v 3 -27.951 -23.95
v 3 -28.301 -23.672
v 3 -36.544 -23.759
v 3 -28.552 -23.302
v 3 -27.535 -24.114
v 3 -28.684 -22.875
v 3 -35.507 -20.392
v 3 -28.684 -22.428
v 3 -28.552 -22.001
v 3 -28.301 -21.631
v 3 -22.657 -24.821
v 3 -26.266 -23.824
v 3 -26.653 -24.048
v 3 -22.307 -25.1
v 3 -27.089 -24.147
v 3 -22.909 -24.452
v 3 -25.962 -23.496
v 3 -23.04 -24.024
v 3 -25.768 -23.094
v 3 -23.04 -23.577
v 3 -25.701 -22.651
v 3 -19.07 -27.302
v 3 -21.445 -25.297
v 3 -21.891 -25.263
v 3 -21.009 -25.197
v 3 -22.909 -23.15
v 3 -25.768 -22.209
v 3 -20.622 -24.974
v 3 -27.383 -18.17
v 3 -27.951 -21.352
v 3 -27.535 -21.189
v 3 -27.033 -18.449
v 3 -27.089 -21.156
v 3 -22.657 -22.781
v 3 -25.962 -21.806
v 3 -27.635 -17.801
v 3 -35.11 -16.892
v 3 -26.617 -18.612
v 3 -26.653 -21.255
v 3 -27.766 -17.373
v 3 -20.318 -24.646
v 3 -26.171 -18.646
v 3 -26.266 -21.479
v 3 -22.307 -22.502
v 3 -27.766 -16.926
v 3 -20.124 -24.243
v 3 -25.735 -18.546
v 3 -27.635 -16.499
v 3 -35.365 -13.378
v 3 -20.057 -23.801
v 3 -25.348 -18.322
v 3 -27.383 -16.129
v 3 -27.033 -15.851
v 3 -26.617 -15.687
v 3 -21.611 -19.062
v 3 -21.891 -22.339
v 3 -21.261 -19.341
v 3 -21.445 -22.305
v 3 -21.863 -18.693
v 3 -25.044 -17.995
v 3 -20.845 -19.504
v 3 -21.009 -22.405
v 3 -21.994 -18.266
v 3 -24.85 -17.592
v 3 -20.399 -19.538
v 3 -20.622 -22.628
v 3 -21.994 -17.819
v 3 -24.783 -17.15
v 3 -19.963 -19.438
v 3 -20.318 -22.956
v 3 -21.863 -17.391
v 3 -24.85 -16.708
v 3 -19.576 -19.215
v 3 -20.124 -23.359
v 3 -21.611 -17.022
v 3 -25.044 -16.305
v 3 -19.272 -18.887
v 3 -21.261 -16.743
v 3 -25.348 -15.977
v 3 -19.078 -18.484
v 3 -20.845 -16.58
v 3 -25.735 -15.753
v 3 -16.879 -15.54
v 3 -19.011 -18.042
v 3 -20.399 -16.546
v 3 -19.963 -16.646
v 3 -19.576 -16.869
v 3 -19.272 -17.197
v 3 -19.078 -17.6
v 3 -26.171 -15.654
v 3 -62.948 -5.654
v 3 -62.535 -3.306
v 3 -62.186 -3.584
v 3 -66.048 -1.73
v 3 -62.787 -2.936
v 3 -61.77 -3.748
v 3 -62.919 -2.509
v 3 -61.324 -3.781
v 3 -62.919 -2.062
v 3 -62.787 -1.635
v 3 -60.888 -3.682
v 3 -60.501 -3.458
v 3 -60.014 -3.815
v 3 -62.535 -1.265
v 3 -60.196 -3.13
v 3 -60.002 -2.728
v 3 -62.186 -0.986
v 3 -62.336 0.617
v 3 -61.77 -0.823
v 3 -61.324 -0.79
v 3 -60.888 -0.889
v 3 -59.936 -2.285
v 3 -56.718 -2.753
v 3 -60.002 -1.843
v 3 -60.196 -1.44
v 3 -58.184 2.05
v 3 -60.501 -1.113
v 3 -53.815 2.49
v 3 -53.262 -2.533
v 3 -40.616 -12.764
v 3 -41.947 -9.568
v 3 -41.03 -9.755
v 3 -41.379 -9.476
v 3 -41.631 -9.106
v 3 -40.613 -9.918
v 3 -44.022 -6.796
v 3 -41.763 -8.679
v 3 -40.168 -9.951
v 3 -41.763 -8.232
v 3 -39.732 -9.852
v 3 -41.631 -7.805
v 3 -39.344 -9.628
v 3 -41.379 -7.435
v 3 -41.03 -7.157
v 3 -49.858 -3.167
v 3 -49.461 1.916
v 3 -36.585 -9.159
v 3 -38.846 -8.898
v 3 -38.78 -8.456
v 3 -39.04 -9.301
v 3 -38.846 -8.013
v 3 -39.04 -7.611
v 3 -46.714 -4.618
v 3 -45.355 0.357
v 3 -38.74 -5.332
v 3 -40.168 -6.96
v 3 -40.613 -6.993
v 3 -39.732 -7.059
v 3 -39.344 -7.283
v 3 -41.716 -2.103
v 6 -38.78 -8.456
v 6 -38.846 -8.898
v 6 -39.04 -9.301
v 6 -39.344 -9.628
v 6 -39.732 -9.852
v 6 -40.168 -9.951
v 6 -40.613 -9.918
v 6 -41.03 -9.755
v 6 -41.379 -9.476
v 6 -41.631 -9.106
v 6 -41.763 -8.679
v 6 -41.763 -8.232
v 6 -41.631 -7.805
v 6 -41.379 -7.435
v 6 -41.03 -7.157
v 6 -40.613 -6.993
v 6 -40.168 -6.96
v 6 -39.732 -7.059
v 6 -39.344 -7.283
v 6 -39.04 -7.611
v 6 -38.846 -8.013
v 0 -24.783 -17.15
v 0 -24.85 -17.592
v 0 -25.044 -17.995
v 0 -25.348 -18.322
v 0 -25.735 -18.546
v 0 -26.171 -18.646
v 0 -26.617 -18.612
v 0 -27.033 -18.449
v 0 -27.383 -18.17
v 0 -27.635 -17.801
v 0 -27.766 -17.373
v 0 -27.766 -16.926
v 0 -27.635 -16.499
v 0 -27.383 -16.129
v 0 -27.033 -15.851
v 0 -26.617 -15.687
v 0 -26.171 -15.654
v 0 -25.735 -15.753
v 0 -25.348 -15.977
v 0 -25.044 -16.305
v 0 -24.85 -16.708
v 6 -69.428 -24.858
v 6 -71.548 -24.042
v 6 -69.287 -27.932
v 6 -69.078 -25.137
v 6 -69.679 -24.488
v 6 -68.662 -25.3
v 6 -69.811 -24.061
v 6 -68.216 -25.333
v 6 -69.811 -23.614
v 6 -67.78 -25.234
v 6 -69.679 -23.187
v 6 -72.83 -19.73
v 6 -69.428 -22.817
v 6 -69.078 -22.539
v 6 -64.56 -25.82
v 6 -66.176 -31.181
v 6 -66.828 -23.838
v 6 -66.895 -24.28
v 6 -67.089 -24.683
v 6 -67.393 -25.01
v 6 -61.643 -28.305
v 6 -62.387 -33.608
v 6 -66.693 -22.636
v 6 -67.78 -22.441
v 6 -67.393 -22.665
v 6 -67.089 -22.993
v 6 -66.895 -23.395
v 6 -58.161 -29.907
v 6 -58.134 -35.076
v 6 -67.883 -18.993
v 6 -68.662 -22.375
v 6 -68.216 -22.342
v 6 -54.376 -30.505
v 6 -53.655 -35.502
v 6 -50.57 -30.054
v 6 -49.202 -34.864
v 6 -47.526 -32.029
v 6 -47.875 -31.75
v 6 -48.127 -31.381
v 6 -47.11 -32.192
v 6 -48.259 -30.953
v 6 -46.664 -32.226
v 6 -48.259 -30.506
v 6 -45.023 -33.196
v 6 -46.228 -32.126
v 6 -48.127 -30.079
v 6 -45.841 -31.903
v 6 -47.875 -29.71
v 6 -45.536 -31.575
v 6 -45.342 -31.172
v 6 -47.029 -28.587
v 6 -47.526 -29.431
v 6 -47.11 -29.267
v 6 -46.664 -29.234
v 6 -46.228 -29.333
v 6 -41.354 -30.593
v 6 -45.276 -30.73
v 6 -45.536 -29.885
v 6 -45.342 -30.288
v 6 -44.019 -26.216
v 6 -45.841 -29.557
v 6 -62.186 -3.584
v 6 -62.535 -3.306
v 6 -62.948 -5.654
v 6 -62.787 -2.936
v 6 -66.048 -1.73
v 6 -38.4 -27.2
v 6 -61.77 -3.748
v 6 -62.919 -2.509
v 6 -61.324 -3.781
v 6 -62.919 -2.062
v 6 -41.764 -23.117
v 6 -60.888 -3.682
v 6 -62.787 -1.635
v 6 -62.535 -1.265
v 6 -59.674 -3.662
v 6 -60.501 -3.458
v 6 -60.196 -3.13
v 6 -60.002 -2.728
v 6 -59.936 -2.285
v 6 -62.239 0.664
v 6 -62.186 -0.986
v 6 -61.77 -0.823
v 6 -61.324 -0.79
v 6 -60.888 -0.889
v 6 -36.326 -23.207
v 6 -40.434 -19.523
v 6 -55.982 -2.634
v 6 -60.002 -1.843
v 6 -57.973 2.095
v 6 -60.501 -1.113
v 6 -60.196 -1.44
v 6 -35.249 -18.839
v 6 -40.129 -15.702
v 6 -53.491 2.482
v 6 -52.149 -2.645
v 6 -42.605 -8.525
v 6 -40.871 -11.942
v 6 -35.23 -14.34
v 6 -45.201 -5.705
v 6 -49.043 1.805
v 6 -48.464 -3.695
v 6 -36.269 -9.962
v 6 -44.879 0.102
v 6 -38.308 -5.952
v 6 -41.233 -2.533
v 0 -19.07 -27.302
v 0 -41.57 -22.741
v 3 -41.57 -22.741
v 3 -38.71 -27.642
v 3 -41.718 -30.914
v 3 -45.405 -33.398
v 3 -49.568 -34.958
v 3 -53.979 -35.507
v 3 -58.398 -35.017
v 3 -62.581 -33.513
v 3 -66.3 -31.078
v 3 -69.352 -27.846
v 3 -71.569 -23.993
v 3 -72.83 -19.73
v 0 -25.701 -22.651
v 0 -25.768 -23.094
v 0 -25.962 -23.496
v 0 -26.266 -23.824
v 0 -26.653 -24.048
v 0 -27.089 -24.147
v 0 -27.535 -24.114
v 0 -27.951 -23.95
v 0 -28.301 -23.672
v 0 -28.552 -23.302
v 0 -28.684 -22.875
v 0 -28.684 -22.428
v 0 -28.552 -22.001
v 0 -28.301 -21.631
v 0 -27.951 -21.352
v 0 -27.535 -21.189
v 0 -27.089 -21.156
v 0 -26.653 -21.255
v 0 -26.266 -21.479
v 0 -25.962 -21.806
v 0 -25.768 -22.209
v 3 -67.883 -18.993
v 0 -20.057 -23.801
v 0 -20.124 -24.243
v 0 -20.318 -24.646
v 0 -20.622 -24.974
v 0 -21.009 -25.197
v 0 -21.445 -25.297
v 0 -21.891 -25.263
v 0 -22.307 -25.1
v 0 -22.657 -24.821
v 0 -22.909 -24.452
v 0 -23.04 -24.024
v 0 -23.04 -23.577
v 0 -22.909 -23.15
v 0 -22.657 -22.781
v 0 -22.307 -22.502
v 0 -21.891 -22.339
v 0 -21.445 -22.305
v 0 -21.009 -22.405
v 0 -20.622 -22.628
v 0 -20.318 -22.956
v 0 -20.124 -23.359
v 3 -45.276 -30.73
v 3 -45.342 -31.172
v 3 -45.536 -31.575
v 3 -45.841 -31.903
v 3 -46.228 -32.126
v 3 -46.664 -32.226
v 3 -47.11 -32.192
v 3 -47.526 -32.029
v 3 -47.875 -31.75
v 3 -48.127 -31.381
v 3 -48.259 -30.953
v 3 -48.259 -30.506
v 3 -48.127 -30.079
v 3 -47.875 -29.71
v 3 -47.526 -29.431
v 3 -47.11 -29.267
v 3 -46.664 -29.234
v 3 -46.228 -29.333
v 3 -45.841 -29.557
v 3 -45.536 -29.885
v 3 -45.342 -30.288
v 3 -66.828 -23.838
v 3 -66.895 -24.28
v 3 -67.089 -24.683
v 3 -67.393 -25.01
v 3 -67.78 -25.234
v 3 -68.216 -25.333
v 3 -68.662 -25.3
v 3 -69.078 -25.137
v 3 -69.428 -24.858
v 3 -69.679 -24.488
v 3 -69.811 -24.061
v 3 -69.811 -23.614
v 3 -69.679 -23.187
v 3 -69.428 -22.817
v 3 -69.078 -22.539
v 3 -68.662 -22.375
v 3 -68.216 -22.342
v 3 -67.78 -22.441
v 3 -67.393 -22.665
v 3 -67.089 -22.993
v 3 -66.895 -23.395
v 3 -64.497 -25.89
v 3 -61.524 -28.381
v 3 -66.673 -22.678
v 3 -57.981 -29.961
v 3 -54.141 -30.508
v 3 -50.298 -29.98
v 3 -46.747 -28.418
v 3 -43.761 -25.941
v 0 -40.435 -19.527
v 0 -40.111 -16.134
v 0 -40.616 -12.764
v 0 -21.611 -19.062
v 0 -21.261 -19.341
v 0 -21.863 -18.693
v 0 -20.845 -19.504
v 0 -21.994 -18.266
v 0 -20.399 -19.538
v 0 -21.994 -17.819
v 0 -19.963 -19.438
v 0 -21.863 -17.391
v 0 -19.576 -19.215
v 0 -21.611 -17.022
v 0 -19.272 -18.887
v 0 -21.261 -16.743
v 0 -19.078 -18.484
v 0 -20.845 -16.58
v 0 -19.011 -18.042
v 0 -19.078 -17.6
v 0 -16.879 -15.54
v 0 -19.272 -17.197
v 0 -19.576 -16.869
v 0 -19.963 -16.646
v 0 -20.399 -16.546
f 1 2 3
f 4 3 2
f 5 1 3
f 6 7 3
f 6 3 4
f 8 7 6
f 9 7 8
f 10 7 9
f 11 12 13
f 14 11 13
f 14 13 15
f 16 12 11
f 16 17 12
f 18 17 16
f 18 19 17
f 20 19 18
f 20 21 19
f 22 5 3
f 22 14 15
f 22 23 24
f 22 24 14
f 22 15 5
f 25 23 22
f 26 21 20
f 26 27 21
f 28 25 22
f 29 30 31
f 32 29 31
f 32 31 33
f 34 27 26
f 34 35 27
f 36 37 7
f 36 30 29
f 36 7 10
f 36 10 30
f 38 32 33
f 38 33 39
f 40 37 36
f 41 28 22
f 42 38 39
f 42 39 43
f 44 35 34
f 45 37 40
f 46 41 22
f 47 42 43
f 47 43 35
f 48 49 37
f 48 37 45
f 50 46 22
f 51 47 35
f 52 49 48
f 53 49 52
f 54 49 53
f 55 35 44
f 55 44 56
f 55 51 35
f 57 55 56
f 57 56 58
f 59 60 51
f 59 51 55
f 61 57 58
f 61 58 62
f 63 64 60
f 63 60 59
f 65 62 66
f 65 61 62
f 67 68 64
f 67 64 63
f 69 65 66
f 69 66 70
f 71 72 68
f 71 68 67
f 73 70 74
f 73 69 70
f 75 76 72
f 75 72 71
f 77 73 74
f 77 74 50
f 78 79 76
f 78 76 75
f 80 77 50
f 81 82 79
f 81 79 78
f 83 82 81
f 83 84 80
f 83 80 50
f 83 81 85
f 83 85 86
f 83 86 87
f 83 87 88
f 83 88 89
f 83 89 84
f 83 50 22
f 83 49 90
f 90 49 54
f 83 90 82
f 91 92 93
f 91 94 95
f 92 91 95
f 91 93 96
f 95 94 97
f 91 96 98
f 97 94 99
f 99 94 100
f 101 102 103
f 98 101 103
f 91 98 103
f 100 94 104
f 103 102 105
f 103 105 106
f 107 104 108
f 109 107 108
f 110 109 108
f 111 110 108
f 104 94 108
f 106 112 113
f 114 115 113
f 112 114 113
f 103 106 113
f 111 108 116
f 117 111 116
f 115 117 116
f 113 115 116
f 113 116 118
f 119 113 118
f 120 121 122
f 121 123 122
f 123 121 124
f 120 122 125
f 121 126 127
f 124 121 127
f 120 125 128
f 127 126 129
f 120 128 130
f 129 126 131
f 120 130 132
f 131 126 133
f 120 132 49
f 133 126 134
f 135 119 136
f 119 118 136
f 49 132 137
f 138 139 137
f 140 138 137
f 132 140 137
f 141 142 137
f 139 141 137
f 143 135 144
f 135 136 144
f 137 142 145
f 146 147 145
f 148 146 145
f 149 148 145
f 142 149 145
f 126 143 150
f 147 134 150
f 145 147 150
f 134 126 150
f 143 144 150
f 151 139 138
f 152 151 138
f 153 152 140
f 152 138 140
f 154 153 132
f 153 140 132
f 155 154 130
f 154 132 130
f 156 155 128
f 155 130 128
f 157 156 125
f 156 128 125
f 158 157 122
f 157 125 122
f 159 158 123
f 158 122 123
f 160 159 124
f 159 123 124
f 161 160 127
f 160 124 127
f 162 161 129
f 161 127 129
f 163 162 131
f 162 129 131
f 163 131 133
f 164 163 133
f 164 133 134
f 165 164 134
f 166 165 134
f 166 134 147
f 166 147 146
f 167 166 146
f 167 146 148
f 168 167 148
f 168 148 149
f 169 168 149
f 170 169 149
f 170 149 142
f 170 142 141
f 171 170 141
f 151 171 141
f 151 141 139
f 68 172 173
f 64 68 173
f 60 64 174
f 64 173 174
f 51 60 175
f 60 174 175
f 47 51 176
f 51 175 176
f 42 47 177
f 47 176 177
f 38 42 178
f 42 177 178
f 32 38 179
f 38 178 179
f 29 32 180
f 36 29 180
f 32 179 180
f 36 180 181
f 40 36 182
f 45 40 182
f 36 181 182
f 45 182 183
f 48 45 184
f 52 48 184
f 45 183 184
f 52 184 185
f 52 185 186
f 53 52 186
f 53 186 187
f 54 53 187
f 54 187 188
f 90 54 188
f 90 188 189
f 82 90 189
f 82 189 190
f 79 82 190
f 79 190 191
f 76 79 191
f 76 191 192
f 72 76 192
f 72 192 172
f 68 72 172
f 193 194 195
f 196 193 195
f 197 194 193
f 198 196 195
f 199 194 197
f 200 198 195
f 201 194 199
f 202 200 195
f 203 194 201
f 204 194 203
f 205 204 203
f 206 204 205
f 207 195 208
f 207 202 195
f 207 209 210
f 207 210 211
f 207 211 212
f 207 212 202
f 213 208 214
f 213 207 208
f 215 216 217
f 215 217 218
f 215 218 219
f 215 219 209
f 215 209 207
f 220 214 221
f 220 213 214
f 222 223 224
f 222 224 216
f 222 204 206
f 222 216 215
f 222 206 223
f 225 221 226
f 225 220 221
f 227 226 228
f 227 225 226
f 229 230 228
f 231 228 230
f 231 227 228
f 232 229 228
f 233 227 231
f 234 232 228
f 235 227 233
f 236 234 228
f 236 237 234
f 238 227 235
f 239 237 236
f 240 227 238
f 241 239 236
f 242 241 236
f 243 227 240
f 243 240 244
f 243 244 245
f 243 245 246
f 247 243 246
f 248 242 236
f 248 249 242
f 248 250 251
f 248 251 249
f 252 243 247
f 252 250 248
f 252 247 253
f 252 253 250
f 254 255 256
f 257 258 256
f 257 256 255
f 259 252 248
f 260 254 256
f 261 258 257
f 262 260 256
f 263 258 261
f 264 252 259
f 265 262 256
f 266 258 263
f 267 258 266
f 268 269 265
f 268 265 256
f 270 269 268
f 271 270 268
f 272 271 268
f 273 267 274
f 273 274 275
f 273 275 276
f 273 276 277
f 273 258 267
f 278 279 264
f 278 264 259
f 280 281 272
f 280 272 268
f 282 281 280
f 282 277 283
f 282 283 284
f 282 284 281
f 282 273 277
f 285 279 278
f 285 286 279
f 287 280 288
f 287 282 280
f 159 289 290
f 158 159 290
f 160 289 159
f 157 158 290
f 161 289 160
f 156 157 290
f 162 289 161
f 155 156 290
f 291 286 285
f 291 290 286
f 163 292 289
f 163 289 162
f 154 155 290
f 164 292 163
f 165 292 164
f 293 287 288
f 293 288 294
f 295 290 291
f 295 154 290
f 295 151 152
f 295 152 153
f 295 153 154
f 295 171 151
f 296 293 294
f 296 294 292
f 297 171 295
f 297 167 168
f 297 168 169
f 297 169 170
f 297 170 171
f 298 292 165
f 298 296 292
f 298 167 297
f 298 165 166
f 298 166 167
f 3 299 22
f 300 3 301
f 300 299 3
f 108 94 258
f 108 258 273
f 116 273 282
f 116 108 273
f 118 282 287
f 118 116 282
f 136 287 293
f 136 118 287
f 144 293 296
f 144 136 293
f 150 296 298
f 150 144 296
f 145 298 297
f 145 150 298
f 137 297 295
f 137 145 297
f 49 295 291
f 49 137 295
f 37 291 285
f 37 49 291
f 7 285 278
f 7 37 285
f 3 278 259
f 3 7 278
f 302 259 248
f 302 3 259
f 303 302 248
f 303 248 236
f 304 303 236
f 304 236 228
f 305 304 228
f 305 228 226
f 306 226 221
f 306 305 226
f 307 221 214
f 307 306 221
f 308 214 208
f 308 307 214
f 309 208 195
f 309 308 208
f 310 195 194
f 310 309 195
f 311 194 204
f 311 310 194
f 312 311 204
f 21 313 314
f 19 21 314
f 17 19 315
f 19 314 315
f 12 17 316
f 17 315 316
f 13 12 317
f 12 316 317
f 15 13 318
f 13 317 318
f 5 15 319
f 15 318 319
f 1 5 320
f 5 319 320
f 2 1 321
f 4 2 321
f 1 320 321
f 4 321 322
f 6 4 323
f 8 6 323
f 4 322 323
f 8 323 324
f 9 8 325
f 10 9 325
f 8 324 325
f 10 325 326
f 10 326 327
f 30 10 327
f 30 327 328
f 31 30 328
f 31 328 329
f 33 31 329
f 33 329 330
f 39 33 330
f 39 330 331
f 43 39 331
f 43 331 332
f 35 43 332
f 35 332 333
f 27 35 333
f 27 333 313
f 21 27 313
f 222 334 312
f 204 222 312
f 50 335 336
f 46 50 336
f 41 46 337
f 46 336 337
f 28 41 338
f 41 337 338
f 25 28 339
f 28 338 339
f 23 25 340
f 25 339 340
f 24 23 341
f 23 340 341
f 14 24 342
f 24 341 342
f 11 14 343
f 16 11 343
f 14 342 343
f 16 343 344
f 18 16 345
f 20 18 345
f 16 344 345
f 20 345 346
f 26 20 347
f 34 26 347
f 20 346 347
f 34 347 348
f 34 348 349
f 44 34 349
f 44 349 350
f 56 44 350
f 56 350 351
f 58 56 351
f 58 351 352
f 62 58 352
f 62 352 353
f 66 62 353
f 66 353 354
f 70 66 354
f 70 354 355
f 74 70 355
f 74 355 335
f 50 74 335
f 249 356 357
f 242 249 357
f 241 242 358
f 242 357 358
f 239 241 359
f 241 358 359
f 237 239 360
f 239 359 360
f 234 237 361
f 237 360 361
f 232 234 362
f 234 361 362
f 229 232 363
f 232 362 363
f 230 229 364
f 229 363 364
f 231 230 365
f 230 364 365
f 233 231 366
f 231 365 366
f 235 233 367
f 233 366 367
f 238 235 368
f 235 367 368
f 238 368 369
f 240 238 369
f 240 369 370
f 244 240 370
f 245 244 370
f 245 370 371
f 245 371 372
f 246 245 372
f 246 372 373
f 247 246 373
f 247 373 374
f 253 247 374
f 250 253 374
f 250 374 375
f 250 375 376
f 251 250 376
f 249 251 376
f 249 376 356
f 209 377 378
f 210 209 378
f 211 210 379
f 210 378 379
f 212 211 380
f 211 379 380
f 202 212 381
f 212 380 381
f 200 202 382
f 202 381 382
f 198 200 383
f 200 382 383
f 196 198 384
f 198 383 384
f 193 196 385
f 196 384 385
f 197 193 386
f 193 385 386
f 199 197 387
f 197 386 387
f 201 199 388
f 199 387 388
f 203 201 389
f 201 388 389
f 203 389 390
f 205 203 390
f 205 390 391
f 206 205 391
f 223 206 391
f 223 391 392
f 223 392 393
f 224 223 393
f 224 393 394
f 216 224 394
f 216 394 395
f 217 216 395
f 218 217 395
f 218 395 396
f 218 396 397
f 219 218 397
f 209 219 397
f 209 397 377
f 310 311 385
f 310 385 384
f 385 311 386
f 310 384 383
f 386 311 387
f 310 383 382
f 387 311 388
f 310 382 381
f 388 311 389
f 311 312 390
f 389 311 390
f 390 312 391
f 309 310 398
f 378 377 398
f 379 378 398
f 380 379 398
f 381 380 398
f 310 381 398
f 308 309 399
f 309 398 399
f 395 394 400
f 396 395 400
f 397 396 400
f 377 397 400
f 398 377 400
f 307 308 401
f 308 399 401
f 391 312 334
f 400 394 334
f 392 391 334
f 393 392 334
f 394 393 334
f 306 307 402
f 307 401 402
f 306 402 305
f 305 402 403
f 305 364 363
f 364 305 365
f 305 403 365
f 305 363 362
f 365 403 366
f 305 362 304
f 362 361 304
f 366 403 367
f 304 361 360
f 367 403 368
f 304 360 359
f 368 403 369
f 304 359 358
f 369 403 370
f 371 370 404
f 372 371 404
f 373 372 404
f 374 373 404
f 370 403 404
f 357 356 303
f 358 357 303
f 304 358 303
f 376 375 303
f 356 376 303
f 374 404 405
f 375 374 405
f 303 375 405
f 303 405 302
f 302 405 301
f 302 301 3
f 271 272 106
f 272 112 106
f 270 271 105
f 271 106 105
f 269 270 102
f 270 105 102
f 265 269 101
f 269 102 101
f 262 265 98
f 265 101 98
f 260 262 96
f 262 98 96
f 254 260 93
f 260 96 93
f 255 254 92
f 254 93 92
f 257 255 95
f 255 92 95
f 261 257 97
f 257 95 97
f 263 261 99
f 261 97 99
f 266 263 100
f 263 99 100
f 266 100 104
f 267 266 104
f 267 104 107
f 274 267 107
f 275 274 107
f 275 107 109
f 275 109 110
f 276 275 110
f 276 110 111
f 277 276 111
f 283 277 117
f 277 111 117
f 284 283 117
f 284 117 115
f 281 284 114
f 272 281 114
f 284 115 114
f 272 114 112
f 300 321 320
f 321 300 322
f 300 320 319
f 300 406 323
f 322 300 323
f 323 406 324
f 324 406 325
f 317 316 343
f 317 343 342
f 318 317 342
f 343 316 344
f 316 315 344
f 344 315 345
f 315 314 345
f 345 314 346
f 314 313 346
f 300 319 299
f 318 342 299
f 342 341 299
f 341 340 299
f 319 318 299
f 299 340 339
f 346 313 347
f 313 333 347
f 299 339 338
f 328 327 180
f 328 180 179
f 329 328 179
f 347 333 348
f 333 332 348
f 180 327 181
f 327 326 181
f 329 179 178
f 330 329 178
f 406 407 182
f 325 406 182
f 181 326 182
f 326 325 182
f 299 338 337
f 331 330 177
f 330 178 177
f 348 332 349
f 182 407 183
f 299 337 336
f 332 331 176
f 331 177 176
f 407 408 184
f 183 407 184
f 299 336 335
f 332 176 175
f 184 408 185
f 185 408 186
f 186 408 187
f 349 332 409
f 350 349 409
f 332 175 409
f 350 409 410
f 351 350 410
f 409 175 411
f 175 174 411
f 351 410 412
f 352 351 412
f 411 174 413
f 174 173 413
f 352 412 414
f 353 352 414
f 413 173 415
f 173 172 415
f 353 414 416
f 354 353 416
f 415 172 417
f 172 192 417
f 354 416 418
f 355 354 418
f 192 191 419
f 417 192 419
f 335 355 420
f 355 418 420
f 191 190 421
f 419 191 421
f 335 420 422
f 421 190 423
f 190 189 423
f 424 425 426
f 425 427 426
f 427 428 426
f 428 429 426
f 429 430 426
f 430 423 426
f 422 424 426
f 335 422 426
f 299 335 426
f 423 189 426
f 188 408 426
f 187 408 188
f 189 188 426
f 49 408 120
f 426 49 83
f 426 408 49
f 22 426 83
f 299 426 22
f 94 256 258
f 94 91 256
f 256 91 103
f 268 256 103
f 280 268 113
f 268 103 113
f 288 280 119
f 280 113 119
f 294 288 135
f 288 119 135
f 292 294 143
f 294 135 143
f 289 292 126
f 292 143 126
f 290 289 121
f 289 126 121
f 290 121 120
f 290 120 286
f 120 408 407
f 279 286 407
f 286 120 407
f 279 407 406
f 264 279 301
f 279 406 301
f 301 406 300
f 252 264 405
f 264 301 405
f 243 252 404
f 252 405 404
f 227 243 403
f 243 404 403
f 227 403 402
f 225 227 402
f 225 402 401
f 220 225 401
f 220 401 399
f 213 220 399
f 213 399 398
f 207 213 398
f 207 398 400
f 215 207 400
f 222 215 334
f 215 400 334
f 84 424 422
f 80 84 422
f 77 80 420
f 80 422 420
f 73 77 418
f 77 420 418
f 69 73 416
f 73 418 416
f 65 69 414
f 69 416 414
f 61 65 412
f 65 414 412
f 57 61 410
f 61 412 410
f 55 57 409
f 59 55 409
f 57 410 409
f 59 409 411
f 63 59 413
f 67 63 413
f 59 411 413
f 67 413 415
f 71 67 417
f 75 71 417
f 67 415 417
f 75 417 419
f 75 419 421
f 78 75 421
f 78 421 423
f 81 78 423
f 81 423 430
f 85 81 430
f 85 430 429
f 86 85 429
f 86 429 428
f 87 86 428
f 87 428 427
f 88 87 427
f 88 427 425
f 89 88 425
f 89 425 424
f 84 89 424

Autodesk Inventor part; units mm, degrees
ref_plane "YZ Plane" through (0, 0, 0) normal (1, 0, 0) x (0, 1, 0)
ref_plane "XZ Plane" through (0, 0, 0) normal (0, 1, 0) x (-1, 0, 0)
ref_plane "XY Plane" through (0, 0, 0) normal (0, 0, 1) x (1, 0, 0)
sketch "Эскиз1" plane through (0, 0, 0) normal (1, 0, 0) x (0, 1, 0)
  circle A0 centre (-54.1058, -16.5076) radius 16
  circle A1 centre (-54.1058, -16.5076) radius 14
  circle A2 centre (-54.1058, -16.5076) radius 19
  line L0 (-54.1058, -16.5076) -> (-62.8101, 0.3813)
  line L1 (-54.1058, -16.5076) -> (-45.4015, -33.3965)
  line L2 (-54.1058, -16.5076) -> (-70.9947, -25.2119)
  line L3 (-54.1058, -16.5076) -> (-37.6871, -6.9458)
  line L4 (-67.8834, -18.9928) -> (-72.8305, -19.73)
  line L5 (-62.9482, -5.6535) -> (-66.048, -1.7298)
  line L6 (-40.6156, -12.7639) -> (-16.8789, -15.5395)
  line L7 (-16.8789, -15.5395) -> (-19.0698, -27.3017)
  line L8 (-19.0698, -27.3017) -> (-41.5699, -22.7407)
  line L9 (-28.383, -14.1943) -> (-30.5675, -24.971)
  line L10 (-28.383, -14.1943) -> (-19.0698, -27.3017)
  line L11 (-30.5675, -24.971) -> (-16.8789, -15.5395)
  line L12 (-23.9604, -20.4186) -> (-22.9207, -14.833)
  line L13 (-22.9207, -14.833) -> (-29.4202, -19.3112)
  line L14 (-22.9207, -14.833) -> (-17.9743, -21.4206)
  line L15 (-23.9604, -20.4186) -> (-24.9531, -26.1091)
  line L16 (-17.9743, -21.4206) -> (-24.9429, -26.0503)
  line L17 (-29.4202, -19.3112) -> (-24.9429, -26.0503)
  circle A3 centre (-61.4358, -2.2854) radius 1.5
  circle A4 centre (-68.328, -23.8376) radius 1.5
  circle A5 centre (-46.7758, -30.7298) radius 1.5
  circle A6 centre (-40.2796, -8.4556) radius 1.5
  circle A7 centre (-26.2831, -17.1497) radius 1.5
  circle A8 centre (-20.5111, -18.0421) radius 1.5
  circle A9 centre (-21.5572, -23.8009) radius 1.5
  circle A10 centre (-27.201, -22.6514) radius 1.5
  point P0 (-6.6177, -23.1834)
  point P1 (-76.739, -12.454)
  point P2 (39.1344, -10.1827)
  point P3 (-35.3653, -13.3778)
  point P4 (-36.5442, -23.7594)
  dimension "d0" = 32
  dimension "d2" = 28
  dimension "d3" = 38
  dimension "d7" = 3
  dimension "d8" = 3
  dimension "d9" = 3
  dimension "d10" = 3
  dimension "d11" = 3
  dimension "d12" = 3
  dimension "d13" = 3
  dimension "d15" = 3
extrude "Выдавливание1" add sketch "Эскиз1" along normal blind 6 contours A0 L8 A1 L6 | A0 L6 A2 L8 | L6 A1 L3 A6 A0 | A0 A6 L3 A2 L6 | L8 A2 L1 A5 A0 | A0 A5 L1 A1 L8 | L3 A1 L0 A3 A0 A6 | L3 A6 A0 A3 L0 A2 | A5 A0 A4 L2 A1 L1 | A2 L2 A4 A0 A5 L1 | A1 L5 A0 A3 L0 | L0 A3 A0 L5 A2 | A2 L4 A0 A4 L2 | L2 A4 A0 L4 A1
extrude "Выдавливание2" add sketch "Эскиз1" along normal blind 3 contours L6 L9 L8 A2 | L10 A7 L13 L9 | L6 L13 A7 L10 | L11 A10 L17 L15 L8 | L9 L17 A10 L11 | L14 A8 L11 L12 | L12 L10 A7 L13 | L6 L11 A8 L14 | L13 A7 L10 L11 A10 L17 | L15 L16 A9 L10 L8 | L7 L14 A8 L11 | L11 A8 L14 L16 A9 L10 | L15 L17 A10 L11 | L10 A9 L16 L15 | L10 A9 L16 L7
extrude "Выдавливание3" cut sketch "Эскиз1" along normal blind 3 contours L6 A1 L3 A6 A0 | A0 A6 L3 A2 L6 | L8 A2 L1 A5 A0 | A0 A5 L1 A1 L8 | L3 A1 L0 A3 A0 A6 | L3 A6 A0 A3 L0 A2 | A5 A0 A4 L2 A1 L1 | A2 L2 A4 A0 A5 L1 | A1 L5 A0 A3 L0 | L0 A3 A0 L5 A2 | A2 L4 A0 A4 L2 | L2 A4 A0 L4 A1
sketch "Эскиз3" plane through (3, 0, 0) normal (-1, 0, 0) x (0, 0, 1)
  line L0 (-32.3349, -33.8419) -> (-22.1169, -29.7797)
  line L1 (-26.451, -18.878) -> (-17.9696, -40.2117)
  line L2 (-26.8452, -44.8668) -> (-37.4977, -23.4738)
  line L3 (-34.7862, -28.919) -> (-27.4833, -31.9131)
  line L4 (-27.4833, -31.9131) -> (-24.288, -24.4799)
  line L5 (-29.5408, -26.736) -> (-24.2332, -24.4564)
  line L6 (-37.4977, -23.4738) -> (-26.451, -18.878)
  line L7 (-31.9743, -21.1759) -> (-24.288, -24.4799)
  line L8 (-34.7862, -28.919) -> (-31.9743, -21.1759)
  line L9 (-22.1169, -29.7797) -> (-37.4977, -23.4738)
  line L10 (-32.3349, -33.8419) -> (-26.451, -18.878)
  line L11 (-29.5408, -26.736) -> (-34.7862, -28.919)
  line L12 (-16.3356, -54.116) -> (-33.3178, -45.5953)
  line L13 (-16.3356, -54.116) -> (-6.9524, -37.5946)
  line L14 (-20.5901, -67.4538) -> (-22.1809, -72.1945)
  line L15 (-16.3356, -54.116) -> (-25.7187, -70.6374)
  line L16 (-16.3356, -54.116) -> (0.1858, -63.4991)
  circle A0 centre (-16.3356, -54.116) radius 14
  circle A1 centre (-16.3356, -54.116) radius 16
  circle A2 centre (-16.3356, -54.116) radius 19
  line L17 (-6.7225, -64.2939) -> (-3.4007, -68.0332)
  circle A3 centre (-24.2372, -68.0287) radius 1.5
  circle A4 centre (-2.4228, -62.0176) radius 1.5
  circle A5 centre (-8.434, -40.2032) radius 1.5
  circle A6 centre (-30.6364, -46.9407) radius 1.5
  circle A7 centre (-31.0082, -30.4679) radius 1.5
  circle A8 centre (-33.4164, -25.147) radius 1.5
  circle A9 centre (-28.0225, -22.8746) radius 1.5
  circle A10 centre (-25.8996, -28.2288) radius 1.5
  point P0 (0, 0)
  point P1 (-7.3565, -75.2836)
  point P2 (-62.9166, -3.4682)
  point P3 (41.7851, -43.7086)
  point P4 (-32.7147, -46.9037)
  point P5 (-33.8935, -57.2853)
  dimension "d22" = 32
  dimension "d23" = 28
  dimension "d24" = 38
  dimension "d25" = 3
  dimension "d26" = 3
  dimension "d27" = 3
  dimension "d28" = 3
  dimension "d29" = 3
  dimension "d30" = 3
  dimension "d31" = 3
  dimension "d32" = 3
properties part number "motor_mound"
